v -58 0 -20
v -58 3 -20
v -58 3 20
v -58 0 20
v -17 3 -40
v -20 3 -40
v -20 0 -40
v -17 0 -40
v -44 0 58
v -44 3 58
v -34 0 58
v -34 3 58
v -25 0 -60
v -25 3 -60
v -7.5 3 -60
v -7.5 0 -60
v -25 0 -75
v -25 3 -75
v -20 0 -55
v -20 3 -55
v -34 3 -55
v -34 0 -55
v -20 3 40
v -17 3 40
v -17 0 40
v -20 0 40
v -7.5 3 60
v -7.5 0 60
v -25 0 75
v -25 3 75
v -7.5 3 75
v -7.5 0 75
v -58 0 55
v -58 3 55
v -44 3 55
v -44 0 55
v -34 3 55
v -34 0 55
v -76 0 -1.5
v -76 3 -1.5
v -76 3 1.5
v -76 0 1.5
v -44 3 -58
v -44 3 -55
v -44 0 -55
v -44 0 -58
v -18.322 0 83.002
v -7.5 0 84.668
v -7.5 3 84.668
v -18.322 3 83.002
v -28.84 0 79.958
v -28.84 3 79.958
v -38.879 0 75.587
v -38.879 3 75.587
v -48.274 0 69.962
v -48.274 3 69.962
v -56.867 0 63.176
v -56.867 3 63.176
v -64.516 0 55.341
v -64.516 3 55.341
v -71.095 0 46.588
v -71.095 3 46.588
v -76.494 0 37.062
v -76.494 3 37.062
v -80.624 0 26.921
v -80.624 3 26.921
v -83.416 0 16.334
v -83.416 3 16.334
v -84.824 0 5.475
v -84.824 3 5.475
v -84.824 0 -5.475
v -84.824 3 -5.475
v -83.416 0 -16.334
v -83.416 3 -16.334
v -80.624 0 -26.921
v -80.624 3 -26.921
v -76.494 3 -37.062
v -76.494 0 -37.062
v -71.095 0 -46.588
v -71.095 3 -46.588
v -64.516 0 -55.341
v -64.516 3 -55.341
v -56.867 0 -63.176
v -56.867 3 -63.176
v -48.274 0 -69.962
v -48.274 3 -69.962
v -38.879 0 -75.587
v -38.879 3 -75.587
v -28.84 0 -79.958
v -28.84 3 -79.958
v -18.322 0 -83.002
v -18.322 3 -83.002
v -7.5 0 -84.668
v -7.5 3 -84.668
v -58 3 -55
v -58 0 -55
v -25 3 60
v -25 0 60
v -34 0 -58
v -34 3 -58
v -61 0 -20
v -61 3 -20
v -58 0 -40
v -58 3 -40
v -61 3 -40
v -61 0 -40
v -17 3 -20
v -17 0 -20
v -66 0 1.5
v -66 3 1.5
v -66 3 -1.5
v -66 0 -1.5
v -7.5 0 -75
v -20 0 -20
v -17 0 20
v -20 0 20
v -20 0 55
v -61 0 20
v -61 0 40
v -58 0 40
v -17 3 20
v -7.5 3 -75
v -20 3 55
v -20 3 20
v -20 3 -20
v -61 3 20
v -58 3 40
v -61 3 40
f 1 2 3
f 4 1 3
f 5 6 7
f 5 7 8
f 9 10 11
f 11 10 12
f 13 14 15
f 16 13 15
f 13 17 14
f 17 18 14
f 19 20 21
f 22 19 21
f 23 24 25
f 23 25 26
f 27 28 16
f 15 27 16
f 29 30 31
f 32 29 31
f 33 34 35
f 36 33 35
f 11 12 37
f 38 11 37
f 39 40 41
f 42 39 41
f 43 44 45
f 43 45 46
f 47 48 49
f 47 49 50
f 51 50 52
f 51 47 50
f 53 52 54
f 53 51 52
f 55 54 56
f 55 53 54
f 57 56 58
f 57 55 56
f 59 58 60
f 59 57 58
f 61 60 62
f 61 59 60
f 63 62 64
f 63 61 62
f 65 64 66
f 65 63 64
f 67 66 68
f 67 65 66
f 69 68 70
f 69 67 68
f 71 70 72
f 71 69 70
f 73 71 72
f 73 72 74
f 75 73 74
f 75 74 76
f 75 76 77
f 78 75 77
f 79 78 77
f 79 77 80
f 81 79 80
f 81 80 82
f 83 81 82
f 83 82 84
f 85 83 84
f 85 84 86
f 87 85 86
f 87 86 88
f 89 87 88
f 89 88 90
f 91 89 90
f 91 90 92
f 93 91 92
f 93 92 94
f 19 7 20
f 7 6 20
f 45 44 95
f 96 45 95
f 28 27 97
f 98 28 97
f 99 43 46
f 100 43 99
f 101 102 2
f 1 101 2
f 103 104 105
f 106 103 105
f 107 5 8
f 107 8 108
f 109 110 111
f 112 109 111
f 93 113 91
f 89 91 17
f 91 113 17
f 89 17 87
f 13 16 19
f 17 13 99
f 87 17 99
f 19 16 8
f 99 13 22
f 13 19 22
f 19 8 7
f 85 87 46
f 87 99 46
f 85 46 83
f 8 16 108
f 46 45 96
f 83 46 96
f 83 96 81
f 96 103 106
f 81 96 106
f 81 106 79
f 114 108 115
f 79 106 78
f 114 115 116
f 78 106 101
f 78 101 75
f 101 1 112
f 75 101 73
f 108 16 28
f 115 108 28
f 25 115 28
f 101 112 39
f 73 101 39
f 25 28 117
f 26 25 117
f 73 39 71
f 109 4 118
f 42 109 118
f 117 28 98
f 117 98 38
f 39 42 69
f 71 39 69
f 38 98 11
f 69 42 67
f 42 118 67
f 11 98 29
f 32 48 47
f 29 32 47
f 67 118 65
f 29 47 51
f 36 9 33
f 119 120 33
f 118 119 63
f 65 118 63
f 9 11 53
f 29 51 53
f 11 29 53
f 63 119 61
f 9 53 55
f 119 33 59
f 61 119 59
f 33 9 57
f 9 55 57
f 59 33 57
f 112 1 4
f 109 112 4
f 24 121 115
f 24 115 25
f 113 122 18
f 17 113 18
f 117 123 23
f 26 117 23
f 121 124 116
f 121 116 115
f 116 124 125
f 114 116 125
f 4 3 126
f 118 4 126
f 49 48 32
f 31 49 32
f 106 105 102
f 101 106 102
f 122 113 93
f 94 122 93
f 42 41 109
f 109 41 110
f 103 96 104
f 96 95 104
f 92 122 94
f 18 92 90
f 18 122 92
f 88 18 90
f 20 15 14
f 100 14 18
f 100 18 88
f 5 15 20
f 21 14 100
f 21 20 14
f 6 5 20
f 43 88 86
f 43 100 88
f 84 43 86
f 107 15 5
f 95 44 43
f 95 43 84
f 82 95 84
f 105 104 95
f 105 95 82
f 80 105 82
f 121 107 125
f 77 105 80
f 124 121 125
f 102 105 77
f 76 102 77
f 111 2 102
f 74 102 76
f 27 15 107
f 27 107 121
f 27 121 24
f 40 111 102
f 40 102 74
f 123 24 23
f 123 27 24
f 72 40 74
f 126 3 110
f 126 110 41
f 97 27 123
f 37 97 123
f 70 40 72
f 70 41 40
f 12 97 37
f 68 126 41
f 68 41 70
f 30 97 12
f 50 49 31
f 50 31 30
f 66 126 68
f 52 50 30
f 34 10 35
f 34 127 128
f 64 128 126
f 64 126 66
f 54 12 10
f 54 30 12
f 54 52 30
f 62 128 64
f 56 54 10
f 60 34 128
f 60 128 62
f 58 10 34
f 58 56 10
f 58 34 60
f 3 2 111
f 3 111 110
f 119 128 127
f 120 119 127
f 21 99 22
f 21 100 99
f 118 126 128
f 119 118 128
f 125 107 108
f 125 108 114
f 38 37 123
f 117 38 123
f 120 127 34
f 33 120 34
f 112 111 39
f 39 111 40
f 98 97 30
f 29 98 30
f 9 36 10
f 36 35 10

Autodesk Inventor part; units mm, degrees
ref_plane "YZ Plane" through (0, 0, 0) normal (1, 0, 0) x (0, 1, 0)
ref_plane "XZ Plane" through (0, 0, 0) normal (0, 1, 0) x (-1, 0, 0)
ref_plane "XY Plane" through (0, 0, 0) normal (0, 0, 1) x (1, 0, 0)
sketch "Sketch1" plane through (0, 0, 0) normal (0, 1, 0) x (-1, 0, 0)
  circle A0 centre (0, 0) radius 85
  line L0 (7.5, 84.6685) -> (7.5, -84.6685)
  dimension "d0" = 170
  dimension "d1" = 7.5
extrude "Extrusion1" add sketch "Sketch1" along normal blind 3 contours A0 L0 picked at (34.1822, 19.1304)
sketch "Sketch2" plane through (0, 3, 0) normal (0, 1, 0) x (1, 0, 0)
  line L0 (-20, 55) -> (-58, 55) construction
  line L1 (-58, 55) -> (-58, -55) construction
  line L2 (-58, -55) -> (-20, -55) construction
  line L3 (-20, -55) -> (-20, 55) construction
  line L4 (-20, 40) -> (-17, 40)
  line L5 (-17, 40) -> (-17, 20)
  line L6 (-17, 20) -> (-20, 20)
  line L7 (-20, 20) -> (-20, 40)
  line L8 (-20, 55) -> (-58, 55)
  line L9 (-58, 55) -> (-58, -55)
  line L10 (-58, -55) -> (-20, -55)
  line L11 (-20, -55) -> (-20, 55)
  line L12 (-20, -20) -> (-17, -20)
  line L13 (-17, -20) -> (-17, -40)
  line L14 (-17, -40) -> (-20, -40)
  line L15 (-20, -40) -> (-20, -20)
  line L16 (-58, 40) -> (-61, 40)
  line L17 (-61, 40) -> (-61, 20)
  line L18 (-61, 20) -> (-58, 20)
  line L19 (-58, 20) -> (-58, 40)
  line L20 (-58, -20) -> (-61, -20)
  line L21 (-61, -20) -> (-61, -40)
  line L22 (-61, -40) -> (-58, -40)
  line L23 (-58, -40) -> (-58, -20)
  line L24 (-34, 55) -> (-44, 55)
  line L25 (-44, 55) -> (-44, 58)
  line L26 (-44, 58) -> (-34, 58)
  line L27 (-34, 58) -> (-34, 55)
  line L28 (-34, -55) -> (-44, -55)
  line L29 (-44, -55) -> (-44, -58)
  line L30 (-44, -58) -> (-34, -58)
  line L31 (-34, -58) -> (-34, -55)
  point P0 (0, 0)
  point P1 (-20, 0)
  point P2 (-39, 58)
  point P3 (-39, 55)
  dimension "d4" = 38
  dimension "d5" = 110
  dimension "d6" = 20
  dimension "d7" = 3
  dimension "d8" = 20
  dimension "d9" = 20
  dimension "d10" = 3
  dimension "d11" = 20
  dimension "d12" = 20
  dimension "d13" = 3
  dimension "d14" = 10
  dimension "d15" = 3
  dimension "d16" = 10
  dimension "d17" = 3
extrude "Extrusion2" cut sketch "Sketch2" against normal blind 3
sketch "Sketch3" plane through (0, 3, 0) normal (0, 1, 0) x (1, 0, 0)
  line L0 (-66, 1.5) -> (-76, 1.5)
  line L1 (-76, 1.5) -> (-76, -1.5)
  line L2 (-76, -1.5) -> (-66, -1.5)
  line L3 (-66, -1.5) -> (-66, 1.5)
  line L4 (-61, 20) -> (-61, 40) projected
  line L5 (-58, -20) -> (-58, 20) projected
  point P0 (0, 0)
  point P1 (-66, 0)
  point P2 (-58, 0)
  dimension "d20" = 10
  dimension "d21" = 3
  dimension "d22" = 5
extrude "Extrusion3" cut sketch "Sketch3" against normal blind 3
sketch "Sketch4" plane through (0, 3, 0) normal (0, 1, 0) x (1, 0, 0)
  line L0 (-7.5, -84.6685) -> (-7.5, 84.6685) projected
  line L1 (-7.5, 75) -> (-25, 75)
  line L2 (-25, 75) -> (-25, 60)
  line L3 (-25, 60) -> (-7.5, 60)
  line L4 (-7.5, 60) -> (-7.5, 75)
  point P0 (0, 0)
  dimension "d25" = 25
  dimension "d26" = 60
  dimension "d27" = 15
extrude "Extrusion4" cut sketch "Sketch4" against normal blind 3
mirror "Mirror1" about plane through (0, 0, 0) normal (0, 0, 1) of "Extrusion4"
sketch "Sketch5" plane through (0, 3, 0) normal (0, 1, 0) x (1, 0, 0)
  point P0 (0, 0)
equation "\"d12\" = d9"
properties part number "Mid Plate"
